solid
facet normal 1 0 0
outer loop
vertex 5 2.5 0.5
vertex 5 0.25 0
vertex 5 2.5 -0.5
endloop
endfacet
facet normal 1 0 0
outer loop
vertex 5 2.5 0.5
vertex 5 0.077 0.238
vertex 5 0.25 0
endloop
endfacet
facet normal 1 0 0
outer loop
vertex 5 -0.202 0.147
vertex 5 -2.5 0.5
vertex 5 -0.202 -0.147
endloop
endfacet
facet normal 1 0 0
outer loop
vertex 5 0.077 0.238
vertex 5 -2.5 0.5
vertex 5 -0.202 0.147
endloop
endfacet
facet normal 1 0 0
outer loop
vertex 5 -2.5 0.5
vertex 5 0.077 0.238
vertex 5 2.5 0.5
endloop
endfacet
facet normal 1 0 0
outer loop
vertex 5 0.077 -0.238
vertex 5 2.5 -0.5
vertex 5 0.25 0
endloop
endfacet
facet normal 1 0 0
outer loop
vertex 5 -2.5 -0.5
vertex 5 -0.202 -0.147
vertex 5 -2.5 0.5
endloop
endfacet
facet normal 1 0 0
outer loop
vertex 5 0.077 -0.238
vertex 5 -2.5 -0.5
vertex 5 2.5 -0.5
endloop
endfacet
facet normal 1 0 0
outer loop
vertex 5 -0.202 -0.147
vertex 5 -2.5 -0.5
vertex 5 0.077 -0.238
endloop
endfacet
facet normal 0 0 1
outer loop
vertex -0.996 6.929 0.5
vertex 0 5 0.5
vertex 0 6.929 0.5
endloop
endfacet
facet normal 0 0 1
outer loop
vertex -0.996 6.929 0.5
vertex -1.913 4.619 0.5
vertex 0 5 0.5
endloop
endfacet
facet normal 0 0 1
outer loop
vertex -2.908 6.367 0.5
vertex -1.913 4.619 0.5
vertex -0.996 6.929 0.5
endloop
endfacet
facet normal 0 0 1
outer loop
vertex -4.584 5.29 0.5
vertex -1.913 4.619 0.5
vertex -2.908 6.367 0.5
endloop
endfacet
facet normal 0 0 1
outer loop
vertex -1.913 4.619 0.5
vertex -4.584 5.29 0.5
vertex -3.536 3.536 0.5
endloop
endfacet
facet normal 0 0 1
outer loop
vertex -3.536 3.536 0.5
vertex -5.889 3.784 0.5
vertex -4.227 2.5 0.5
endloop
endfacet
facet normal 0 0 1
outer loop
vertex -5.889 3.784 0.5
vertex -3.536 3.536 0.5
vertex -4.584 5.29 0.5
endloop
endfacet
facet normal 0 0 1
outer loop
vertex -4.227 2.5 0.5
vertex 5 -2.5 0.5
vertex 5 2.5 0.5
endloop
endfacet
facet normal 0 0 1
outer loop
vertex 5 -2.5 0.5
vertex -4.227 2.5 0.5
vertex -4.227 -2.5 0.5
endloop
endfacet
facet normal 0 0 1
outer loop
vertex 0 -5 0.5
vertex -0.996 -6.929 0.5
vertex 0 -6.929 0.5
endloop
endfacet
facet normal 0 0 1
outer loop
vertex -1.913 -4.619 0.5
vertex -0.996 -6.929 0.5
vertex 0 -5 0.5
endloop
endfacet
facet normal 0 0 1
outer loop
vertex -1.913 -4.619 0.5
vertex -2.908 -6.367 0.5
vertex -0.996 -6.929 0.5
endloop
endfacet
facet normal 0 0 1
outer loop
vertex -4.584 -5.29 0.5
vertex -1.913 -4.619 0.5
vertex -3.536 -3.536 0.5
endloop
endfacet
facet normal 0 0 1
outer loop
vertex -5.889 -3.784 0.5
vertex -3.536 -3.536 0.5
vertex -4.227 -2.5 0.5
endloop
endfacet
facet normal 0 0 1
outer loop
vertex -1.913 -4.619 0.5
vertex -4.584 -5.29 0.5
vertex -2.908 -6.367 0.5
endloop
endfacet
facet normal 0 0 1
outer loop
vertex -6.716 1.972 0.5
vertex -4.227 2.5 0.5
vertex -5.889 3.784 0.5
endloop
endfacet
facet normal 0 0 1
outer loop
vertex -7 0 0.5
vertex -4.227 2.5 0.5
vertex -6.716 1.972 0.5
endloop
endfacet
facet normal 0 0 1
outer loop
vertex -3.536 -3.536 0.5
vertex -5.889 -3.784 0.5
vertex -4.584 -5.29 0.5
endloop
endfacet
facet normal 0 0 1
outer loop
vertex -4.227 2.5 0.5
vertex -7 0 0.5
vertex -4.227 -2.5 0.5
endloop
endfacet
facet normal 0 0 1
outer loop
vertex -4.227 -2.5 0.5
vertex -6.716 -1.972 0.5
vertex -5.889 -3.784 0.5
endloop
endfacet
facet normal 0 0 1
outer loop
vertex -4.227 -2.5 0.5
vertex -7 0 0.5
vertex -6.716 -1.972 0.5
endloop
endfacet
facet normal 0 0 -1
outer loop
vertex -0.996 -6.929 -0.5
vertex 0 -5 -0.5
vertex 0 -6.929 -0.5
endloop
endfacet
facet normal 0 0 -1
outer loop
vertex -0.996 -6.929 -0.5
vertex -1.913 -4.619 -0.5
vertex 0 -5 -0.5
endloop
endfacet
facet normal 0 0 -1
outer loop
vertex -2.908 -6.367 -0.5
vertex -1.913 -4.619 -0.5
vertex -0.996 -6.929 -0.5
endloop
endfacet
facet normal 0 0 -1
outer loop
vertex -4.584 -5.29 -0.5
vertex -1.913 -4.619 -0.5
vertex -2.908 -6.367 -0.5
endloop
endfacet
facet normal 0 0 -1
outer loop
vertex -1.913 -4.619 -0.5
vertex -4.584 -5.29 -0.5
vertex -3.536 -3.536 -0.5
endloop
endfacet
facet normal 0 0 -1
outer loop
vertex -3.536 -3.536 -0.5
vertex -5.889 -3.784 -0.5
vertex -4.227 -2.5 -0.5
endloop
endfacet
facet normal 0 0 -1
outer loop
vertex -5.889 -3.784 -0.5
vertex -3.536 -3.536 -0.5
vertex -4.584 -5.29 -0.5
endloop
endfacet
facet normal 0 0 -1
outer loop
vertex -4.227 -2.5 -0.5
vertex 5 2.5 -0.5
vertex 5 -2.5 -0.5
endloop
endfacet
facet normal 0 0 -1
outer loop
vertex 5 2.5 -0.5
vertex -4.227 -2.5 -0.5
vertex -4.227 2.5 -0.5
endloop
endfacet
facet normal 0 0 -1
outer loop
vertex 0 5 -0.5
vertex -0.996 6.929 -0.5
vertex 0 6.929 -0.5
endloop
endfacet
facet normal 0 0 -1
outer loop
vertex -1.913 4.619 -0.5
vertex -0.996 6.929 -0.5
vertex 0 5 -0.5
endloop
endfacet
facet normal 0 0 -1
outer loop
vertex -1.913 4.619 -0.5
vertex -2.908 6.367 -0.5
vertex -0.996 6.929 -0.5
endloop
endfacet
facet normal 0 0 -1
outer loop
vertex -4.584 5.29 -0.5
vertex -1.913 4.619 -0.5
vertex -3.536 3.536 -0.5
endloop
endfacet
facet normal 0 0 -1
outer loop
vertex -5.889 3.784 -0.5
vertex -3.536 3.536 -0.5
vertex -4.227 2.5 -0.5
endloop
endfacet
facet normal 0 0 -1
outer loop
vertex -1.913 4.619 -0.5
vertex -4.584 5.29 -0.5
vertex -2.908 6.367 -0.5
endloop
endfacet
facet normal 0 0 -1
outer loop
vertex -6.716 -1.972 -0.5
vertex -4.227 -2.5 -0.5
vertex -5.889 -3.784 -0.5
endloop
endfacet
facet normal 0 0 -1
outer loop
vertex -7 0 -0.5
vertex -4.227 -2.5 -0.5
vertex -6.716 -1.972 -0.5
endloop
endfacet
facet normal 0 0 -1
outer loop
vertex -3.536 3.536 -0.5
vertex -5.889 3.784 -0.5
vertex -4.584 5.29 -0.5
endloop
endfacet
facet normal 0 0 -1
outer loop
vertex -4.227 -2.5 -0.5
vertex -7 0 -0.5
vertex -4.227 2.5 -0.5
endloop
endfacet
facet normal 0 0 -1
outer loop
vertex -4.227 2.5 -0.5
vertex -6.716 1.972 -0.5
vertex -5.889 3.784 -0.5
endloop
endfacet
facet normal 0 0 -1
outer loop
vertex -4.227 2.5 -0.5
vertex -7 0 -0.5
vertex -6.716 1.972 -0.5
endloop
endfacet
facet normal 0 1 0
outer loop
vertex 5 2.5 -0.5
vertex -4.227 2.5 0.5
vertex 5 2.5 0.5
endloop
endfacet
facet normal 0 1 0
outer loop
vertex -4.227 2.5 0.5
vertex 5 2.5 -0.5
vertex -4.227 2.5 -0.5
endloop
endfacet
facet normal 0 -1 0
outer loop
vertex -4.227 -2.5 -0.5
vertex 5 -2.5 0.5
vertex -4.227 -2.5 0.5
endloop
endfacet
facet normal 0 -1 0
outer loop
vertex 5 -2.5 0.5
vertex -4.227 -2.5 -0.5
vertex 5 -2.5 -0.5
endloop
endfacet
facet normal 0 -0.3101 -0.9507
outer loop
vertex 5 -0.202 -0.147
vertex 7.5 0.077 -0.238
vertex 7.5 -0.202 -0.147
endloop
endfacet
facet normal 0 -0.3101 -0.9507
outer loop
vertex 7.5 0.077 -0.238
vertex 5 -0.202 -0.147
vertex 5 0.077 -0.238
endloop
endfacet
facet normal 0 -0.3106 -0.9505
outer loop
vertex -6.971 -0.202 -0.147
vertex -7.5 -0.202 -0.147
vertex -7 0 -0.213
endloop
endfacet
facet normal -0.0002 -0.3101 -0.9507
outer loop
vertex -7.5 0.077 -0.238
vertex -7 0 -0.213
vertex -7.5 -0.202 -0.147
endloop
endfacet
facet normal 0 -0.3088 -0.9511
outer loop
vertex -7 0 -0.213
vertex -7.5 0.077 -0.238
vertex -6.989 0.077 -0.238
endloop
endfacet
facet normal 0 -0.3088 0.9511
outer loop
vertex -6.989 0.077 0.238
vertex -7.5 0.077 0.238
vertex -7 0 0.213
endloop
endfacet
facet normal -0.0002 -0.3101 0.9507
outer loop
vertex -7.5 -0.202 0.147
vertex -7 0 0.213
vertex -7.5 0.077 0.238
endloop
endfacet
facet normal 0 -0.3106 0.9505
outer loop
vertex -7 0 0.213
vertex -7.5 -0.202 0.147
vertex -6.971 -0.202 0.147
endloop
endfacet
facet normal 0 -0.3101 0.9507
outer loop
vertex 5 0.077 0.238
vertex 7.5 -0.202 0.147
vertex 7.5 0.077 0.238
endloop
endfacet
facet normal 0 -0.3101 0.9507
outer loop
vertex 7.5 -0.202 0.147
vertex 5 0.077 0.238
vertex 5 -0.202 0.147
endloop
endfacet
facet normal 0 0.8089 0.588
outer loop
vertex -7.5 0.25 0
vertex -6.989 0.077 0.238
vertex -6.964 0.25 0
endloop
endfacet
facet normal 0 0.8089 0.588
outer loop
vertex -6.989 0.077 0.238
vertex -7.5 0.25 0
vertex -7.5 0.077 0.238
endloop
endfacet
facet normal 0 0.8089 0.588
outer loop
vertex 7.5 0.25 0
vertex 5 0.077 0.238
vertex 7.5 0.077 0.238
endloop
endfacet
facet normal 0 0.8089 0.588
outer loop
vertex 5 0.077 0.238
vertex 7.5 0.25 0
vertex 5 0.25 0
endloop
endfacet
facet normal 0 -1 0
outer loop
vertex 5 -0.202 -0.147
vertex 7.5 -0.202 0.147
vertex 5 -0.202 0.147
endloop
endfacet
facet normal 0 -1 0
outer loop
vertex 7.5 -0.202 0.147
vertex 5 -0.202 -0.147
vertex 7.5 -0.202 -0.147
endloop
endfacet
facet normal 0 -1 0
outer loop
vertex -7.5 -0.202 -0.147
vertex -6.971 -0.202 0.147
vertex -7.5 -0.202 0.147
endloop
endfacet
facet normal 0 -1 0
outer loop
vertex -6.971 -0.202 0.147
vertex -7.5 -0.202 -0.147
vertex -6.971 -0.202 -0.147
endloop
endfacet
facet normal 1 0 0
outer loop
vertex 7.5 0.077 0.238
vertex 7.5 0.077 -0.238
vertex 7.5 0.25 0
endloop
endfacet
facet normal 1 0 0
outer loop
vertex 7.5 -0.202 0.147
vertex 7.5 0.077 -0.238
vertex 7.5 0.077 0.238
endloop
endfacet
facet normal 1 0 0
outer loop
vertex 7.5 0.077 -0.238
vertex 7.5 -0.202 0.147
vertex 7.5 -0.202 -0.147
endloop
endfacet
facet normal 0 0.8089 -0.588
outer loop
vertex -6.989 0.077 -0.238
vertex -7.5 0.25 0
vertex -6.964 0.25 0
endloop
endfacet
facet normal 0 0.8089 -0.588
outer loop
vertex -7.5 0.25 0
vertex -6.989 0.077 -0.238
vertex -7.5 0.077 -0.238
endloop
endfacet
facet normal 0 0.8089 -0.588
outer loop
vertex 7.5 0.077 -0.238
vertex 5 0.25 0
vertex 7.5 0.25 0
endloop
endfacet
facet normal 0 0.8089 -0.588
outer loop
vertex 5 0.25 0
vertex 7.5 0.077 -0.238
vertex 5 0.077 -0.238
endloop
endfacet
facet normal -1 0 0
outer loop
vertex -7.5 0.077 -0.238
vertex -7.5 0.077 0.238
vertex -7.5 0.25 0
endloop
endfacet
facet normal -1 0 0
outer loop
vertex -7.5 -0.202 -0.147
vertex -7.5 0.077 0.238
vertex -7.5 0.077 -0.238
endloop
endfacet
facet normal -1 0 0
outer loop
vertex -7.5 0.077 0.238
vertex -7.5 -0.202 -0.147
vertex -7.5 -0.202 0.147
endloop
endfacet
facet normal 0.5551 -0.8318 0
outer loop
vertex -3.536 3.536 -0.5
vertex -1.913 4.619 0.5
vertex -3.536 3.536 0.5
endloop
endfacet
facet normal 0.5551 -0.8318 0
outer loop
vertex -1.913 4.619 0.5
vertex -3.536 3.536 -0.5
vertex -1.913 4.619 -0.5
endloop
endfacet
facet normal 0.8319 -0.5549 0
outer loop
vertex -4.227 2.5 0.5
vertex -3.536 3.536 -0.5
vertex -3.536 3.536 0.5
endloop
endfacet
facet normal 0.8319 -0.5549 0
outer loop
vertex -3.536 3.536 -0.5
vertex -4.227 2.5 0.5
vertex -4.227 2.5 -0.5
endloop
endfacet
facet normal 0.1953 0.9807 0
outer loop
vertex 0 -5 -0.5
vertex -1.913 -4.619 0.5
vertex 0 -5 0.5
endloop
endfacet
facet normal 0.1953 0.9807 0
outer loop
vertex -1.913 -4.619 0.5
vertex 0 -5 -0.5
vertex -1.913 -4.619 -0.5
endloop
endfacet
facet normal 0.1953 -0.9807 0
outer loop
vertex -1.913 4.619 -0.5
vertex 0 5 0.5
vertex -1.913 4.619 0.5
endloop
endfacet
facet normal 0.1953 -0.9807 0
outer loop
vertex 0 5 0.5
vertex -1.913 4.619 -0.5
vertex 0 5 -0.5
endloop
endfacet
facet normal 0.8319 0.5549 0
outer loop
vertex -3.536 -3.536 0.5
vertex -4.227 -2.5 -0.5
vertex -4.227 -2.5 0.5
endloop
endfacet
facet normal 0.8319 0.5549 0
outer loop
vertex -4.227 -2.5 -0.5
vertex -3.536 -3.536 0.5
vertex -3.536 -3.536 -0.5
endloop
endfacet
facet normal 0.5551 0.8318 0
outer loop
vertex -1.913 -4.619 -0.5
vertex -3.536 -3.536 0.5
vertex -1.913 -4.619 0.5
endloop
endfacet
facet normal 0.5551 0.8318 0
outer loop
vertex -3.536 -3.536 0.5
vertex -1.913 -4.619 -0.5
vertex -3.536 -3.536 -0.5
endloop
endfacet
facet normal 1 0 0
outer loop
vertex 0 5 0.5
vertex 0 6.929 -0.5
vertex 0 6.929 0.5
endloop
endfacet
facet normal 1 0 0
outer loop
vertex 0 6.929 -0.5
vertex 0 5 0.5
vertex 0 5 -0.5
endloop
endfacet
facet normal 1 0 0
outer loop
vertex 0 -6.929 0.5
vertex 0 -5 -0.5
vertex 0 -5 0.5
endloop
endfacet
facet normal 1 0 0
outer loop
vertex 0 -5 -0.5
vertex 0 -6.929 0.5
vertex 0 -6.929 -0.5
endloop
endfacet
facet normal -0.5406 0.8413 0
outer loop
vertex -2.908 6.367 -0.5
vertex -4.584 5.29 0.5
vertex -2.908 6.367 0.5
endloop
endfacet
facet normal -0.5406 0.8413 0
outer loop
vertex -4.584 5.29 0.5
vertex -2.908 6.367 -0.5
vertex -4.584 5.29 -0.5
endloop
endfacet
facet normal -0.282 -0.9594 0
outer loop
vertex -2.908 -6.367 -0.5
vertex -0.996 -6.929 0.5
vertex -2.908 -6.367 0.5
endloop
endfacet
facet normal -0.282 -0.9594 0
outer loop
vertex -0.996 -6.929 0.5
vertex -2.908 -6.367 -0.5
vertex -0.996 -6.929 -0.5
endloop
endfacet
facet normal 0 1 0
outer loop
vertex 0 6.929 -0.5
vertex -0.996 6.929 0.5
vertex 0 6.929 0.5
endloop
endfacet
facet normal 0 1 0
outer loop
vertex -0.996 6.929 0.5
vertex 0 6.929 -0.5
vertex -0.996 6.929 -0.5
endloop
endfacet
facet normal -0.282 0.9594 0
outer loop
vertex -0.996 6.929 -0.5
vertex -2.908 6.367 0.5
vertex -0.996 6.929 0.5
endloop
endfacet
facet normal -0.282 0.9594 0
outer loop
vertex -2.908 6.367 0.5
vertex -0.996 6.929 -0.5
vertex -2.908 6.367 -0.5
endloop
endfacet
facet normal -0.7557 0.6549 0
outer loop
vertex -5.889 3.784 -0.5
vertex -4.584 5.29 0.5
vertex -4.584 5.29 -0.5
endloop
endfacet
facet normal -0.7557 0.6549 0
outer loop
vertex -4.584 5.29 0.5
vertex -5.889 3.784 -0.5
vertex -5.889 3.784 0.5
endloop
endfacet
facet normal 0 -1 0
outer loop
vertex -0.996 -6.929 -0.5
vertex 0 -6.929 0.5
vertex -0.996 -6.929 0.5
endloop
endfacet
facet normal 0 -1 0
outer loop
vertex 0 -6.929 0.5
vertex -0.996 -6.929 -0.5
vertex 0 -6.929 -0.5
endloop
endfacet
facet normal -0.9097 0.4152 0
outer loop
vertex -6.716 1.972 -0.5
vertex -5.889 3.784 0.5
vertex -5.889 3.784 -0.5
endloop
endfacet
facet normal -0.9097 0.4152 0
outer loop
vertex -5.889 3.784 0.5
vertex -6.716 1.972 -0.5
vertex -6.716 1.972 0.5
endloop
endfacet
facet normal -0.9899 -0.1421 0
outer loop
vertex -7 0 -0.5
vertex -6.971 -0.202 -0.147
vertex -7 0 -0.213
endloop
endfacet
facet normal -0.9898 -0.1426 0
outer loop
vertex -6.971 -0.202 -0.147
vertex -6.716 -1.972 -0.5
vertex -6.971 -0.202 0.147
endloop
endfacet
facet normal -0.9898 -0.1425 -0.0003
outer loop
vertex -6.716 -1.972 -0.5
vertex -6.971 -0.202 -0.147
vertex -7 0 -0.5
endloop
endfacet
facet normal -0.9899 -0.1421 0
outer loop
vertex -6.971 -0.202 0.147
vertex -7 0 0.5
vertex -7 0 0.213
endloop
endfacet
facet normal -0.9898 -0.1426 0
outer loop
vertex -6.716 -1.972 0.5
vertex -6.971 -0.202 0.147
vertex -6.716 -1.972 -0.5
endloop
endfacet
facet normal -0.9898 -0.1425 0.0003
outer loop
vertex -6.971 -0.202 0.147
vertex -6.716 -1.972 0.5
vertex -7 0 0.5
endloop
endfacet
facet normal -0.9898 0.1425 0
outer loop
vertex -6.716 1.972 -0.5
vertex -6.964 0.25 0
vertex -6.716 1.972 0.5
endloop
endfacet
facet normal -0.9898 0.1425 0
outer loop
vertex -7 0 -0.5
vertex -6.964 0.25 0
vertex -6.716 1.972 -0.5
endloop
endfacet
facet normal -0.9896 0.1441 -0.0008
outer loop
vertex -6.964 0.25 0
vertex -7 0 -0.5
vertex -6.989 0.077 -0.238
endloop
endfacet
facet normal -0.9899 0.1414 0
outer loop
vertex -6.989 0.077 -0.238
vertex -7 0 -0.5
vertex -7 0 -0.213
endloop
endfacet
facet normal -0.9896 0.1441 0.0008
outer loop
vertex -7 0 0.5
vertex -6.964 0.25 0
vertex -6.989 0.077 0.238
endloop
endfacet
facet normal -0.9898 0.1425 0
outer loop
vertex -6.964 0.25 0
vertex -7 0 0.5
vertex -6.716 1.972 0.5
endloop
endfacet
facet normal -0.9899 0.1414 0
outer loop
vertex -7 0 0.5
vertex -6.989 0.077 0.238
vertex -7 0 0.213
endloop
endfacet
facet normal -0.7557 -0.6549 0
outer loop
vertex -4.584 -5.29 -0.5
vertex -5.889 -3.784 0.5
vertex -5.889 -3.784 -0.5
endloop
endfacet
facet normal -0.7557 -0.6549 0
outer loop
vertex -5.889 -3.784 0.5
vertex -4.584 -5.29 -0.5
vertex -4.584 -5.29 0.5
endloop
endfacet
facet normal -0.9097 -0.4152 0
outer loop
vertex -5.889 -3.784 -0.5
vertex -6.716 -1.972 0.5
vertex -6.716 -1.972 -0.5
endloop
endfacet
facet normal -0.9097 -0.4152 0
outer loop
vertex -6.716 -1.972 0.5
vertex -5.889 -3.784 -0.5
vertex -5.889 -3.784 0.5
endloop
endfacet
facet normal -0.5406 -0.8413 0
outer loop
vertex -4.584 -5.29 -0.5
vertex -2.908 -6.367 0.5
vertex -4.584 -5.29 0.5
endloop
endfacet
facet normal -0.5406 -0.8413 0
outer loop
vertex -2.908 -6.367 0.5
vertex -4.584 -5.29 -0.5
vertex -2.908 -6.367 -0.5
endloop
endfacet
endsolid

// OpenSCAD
//falling leaf

module leaf(length,width,thickness) {
    union(){
   cube([length,length/2,thickness],center=true); 
        rotate([90,0,90]) cylinder(h=length+5,d=0.5,center=true);
}
}

module torus(od,thickness) {
    difference(){
    
        cylinder(h=thickness,d=od,center=true);
    
       {
           cylinder(h=thickness+1,d=od-2*thickness,center=true);
           translate([od/2,0,0]) cube([od,od,thickness+1],center=true);
       }
    }
}

module g1() {
    union(){
    rotate([$t*360,$t*360,$t*360]) leaf(10,5,1) ;
    rotate([0,$t*360,$t*360]) torus(12,1);
 
    }
}

module g2() {
union() {
    g1();
    rotate([0,0,$t*360])  torus(14,1);
}    
}

g2();
